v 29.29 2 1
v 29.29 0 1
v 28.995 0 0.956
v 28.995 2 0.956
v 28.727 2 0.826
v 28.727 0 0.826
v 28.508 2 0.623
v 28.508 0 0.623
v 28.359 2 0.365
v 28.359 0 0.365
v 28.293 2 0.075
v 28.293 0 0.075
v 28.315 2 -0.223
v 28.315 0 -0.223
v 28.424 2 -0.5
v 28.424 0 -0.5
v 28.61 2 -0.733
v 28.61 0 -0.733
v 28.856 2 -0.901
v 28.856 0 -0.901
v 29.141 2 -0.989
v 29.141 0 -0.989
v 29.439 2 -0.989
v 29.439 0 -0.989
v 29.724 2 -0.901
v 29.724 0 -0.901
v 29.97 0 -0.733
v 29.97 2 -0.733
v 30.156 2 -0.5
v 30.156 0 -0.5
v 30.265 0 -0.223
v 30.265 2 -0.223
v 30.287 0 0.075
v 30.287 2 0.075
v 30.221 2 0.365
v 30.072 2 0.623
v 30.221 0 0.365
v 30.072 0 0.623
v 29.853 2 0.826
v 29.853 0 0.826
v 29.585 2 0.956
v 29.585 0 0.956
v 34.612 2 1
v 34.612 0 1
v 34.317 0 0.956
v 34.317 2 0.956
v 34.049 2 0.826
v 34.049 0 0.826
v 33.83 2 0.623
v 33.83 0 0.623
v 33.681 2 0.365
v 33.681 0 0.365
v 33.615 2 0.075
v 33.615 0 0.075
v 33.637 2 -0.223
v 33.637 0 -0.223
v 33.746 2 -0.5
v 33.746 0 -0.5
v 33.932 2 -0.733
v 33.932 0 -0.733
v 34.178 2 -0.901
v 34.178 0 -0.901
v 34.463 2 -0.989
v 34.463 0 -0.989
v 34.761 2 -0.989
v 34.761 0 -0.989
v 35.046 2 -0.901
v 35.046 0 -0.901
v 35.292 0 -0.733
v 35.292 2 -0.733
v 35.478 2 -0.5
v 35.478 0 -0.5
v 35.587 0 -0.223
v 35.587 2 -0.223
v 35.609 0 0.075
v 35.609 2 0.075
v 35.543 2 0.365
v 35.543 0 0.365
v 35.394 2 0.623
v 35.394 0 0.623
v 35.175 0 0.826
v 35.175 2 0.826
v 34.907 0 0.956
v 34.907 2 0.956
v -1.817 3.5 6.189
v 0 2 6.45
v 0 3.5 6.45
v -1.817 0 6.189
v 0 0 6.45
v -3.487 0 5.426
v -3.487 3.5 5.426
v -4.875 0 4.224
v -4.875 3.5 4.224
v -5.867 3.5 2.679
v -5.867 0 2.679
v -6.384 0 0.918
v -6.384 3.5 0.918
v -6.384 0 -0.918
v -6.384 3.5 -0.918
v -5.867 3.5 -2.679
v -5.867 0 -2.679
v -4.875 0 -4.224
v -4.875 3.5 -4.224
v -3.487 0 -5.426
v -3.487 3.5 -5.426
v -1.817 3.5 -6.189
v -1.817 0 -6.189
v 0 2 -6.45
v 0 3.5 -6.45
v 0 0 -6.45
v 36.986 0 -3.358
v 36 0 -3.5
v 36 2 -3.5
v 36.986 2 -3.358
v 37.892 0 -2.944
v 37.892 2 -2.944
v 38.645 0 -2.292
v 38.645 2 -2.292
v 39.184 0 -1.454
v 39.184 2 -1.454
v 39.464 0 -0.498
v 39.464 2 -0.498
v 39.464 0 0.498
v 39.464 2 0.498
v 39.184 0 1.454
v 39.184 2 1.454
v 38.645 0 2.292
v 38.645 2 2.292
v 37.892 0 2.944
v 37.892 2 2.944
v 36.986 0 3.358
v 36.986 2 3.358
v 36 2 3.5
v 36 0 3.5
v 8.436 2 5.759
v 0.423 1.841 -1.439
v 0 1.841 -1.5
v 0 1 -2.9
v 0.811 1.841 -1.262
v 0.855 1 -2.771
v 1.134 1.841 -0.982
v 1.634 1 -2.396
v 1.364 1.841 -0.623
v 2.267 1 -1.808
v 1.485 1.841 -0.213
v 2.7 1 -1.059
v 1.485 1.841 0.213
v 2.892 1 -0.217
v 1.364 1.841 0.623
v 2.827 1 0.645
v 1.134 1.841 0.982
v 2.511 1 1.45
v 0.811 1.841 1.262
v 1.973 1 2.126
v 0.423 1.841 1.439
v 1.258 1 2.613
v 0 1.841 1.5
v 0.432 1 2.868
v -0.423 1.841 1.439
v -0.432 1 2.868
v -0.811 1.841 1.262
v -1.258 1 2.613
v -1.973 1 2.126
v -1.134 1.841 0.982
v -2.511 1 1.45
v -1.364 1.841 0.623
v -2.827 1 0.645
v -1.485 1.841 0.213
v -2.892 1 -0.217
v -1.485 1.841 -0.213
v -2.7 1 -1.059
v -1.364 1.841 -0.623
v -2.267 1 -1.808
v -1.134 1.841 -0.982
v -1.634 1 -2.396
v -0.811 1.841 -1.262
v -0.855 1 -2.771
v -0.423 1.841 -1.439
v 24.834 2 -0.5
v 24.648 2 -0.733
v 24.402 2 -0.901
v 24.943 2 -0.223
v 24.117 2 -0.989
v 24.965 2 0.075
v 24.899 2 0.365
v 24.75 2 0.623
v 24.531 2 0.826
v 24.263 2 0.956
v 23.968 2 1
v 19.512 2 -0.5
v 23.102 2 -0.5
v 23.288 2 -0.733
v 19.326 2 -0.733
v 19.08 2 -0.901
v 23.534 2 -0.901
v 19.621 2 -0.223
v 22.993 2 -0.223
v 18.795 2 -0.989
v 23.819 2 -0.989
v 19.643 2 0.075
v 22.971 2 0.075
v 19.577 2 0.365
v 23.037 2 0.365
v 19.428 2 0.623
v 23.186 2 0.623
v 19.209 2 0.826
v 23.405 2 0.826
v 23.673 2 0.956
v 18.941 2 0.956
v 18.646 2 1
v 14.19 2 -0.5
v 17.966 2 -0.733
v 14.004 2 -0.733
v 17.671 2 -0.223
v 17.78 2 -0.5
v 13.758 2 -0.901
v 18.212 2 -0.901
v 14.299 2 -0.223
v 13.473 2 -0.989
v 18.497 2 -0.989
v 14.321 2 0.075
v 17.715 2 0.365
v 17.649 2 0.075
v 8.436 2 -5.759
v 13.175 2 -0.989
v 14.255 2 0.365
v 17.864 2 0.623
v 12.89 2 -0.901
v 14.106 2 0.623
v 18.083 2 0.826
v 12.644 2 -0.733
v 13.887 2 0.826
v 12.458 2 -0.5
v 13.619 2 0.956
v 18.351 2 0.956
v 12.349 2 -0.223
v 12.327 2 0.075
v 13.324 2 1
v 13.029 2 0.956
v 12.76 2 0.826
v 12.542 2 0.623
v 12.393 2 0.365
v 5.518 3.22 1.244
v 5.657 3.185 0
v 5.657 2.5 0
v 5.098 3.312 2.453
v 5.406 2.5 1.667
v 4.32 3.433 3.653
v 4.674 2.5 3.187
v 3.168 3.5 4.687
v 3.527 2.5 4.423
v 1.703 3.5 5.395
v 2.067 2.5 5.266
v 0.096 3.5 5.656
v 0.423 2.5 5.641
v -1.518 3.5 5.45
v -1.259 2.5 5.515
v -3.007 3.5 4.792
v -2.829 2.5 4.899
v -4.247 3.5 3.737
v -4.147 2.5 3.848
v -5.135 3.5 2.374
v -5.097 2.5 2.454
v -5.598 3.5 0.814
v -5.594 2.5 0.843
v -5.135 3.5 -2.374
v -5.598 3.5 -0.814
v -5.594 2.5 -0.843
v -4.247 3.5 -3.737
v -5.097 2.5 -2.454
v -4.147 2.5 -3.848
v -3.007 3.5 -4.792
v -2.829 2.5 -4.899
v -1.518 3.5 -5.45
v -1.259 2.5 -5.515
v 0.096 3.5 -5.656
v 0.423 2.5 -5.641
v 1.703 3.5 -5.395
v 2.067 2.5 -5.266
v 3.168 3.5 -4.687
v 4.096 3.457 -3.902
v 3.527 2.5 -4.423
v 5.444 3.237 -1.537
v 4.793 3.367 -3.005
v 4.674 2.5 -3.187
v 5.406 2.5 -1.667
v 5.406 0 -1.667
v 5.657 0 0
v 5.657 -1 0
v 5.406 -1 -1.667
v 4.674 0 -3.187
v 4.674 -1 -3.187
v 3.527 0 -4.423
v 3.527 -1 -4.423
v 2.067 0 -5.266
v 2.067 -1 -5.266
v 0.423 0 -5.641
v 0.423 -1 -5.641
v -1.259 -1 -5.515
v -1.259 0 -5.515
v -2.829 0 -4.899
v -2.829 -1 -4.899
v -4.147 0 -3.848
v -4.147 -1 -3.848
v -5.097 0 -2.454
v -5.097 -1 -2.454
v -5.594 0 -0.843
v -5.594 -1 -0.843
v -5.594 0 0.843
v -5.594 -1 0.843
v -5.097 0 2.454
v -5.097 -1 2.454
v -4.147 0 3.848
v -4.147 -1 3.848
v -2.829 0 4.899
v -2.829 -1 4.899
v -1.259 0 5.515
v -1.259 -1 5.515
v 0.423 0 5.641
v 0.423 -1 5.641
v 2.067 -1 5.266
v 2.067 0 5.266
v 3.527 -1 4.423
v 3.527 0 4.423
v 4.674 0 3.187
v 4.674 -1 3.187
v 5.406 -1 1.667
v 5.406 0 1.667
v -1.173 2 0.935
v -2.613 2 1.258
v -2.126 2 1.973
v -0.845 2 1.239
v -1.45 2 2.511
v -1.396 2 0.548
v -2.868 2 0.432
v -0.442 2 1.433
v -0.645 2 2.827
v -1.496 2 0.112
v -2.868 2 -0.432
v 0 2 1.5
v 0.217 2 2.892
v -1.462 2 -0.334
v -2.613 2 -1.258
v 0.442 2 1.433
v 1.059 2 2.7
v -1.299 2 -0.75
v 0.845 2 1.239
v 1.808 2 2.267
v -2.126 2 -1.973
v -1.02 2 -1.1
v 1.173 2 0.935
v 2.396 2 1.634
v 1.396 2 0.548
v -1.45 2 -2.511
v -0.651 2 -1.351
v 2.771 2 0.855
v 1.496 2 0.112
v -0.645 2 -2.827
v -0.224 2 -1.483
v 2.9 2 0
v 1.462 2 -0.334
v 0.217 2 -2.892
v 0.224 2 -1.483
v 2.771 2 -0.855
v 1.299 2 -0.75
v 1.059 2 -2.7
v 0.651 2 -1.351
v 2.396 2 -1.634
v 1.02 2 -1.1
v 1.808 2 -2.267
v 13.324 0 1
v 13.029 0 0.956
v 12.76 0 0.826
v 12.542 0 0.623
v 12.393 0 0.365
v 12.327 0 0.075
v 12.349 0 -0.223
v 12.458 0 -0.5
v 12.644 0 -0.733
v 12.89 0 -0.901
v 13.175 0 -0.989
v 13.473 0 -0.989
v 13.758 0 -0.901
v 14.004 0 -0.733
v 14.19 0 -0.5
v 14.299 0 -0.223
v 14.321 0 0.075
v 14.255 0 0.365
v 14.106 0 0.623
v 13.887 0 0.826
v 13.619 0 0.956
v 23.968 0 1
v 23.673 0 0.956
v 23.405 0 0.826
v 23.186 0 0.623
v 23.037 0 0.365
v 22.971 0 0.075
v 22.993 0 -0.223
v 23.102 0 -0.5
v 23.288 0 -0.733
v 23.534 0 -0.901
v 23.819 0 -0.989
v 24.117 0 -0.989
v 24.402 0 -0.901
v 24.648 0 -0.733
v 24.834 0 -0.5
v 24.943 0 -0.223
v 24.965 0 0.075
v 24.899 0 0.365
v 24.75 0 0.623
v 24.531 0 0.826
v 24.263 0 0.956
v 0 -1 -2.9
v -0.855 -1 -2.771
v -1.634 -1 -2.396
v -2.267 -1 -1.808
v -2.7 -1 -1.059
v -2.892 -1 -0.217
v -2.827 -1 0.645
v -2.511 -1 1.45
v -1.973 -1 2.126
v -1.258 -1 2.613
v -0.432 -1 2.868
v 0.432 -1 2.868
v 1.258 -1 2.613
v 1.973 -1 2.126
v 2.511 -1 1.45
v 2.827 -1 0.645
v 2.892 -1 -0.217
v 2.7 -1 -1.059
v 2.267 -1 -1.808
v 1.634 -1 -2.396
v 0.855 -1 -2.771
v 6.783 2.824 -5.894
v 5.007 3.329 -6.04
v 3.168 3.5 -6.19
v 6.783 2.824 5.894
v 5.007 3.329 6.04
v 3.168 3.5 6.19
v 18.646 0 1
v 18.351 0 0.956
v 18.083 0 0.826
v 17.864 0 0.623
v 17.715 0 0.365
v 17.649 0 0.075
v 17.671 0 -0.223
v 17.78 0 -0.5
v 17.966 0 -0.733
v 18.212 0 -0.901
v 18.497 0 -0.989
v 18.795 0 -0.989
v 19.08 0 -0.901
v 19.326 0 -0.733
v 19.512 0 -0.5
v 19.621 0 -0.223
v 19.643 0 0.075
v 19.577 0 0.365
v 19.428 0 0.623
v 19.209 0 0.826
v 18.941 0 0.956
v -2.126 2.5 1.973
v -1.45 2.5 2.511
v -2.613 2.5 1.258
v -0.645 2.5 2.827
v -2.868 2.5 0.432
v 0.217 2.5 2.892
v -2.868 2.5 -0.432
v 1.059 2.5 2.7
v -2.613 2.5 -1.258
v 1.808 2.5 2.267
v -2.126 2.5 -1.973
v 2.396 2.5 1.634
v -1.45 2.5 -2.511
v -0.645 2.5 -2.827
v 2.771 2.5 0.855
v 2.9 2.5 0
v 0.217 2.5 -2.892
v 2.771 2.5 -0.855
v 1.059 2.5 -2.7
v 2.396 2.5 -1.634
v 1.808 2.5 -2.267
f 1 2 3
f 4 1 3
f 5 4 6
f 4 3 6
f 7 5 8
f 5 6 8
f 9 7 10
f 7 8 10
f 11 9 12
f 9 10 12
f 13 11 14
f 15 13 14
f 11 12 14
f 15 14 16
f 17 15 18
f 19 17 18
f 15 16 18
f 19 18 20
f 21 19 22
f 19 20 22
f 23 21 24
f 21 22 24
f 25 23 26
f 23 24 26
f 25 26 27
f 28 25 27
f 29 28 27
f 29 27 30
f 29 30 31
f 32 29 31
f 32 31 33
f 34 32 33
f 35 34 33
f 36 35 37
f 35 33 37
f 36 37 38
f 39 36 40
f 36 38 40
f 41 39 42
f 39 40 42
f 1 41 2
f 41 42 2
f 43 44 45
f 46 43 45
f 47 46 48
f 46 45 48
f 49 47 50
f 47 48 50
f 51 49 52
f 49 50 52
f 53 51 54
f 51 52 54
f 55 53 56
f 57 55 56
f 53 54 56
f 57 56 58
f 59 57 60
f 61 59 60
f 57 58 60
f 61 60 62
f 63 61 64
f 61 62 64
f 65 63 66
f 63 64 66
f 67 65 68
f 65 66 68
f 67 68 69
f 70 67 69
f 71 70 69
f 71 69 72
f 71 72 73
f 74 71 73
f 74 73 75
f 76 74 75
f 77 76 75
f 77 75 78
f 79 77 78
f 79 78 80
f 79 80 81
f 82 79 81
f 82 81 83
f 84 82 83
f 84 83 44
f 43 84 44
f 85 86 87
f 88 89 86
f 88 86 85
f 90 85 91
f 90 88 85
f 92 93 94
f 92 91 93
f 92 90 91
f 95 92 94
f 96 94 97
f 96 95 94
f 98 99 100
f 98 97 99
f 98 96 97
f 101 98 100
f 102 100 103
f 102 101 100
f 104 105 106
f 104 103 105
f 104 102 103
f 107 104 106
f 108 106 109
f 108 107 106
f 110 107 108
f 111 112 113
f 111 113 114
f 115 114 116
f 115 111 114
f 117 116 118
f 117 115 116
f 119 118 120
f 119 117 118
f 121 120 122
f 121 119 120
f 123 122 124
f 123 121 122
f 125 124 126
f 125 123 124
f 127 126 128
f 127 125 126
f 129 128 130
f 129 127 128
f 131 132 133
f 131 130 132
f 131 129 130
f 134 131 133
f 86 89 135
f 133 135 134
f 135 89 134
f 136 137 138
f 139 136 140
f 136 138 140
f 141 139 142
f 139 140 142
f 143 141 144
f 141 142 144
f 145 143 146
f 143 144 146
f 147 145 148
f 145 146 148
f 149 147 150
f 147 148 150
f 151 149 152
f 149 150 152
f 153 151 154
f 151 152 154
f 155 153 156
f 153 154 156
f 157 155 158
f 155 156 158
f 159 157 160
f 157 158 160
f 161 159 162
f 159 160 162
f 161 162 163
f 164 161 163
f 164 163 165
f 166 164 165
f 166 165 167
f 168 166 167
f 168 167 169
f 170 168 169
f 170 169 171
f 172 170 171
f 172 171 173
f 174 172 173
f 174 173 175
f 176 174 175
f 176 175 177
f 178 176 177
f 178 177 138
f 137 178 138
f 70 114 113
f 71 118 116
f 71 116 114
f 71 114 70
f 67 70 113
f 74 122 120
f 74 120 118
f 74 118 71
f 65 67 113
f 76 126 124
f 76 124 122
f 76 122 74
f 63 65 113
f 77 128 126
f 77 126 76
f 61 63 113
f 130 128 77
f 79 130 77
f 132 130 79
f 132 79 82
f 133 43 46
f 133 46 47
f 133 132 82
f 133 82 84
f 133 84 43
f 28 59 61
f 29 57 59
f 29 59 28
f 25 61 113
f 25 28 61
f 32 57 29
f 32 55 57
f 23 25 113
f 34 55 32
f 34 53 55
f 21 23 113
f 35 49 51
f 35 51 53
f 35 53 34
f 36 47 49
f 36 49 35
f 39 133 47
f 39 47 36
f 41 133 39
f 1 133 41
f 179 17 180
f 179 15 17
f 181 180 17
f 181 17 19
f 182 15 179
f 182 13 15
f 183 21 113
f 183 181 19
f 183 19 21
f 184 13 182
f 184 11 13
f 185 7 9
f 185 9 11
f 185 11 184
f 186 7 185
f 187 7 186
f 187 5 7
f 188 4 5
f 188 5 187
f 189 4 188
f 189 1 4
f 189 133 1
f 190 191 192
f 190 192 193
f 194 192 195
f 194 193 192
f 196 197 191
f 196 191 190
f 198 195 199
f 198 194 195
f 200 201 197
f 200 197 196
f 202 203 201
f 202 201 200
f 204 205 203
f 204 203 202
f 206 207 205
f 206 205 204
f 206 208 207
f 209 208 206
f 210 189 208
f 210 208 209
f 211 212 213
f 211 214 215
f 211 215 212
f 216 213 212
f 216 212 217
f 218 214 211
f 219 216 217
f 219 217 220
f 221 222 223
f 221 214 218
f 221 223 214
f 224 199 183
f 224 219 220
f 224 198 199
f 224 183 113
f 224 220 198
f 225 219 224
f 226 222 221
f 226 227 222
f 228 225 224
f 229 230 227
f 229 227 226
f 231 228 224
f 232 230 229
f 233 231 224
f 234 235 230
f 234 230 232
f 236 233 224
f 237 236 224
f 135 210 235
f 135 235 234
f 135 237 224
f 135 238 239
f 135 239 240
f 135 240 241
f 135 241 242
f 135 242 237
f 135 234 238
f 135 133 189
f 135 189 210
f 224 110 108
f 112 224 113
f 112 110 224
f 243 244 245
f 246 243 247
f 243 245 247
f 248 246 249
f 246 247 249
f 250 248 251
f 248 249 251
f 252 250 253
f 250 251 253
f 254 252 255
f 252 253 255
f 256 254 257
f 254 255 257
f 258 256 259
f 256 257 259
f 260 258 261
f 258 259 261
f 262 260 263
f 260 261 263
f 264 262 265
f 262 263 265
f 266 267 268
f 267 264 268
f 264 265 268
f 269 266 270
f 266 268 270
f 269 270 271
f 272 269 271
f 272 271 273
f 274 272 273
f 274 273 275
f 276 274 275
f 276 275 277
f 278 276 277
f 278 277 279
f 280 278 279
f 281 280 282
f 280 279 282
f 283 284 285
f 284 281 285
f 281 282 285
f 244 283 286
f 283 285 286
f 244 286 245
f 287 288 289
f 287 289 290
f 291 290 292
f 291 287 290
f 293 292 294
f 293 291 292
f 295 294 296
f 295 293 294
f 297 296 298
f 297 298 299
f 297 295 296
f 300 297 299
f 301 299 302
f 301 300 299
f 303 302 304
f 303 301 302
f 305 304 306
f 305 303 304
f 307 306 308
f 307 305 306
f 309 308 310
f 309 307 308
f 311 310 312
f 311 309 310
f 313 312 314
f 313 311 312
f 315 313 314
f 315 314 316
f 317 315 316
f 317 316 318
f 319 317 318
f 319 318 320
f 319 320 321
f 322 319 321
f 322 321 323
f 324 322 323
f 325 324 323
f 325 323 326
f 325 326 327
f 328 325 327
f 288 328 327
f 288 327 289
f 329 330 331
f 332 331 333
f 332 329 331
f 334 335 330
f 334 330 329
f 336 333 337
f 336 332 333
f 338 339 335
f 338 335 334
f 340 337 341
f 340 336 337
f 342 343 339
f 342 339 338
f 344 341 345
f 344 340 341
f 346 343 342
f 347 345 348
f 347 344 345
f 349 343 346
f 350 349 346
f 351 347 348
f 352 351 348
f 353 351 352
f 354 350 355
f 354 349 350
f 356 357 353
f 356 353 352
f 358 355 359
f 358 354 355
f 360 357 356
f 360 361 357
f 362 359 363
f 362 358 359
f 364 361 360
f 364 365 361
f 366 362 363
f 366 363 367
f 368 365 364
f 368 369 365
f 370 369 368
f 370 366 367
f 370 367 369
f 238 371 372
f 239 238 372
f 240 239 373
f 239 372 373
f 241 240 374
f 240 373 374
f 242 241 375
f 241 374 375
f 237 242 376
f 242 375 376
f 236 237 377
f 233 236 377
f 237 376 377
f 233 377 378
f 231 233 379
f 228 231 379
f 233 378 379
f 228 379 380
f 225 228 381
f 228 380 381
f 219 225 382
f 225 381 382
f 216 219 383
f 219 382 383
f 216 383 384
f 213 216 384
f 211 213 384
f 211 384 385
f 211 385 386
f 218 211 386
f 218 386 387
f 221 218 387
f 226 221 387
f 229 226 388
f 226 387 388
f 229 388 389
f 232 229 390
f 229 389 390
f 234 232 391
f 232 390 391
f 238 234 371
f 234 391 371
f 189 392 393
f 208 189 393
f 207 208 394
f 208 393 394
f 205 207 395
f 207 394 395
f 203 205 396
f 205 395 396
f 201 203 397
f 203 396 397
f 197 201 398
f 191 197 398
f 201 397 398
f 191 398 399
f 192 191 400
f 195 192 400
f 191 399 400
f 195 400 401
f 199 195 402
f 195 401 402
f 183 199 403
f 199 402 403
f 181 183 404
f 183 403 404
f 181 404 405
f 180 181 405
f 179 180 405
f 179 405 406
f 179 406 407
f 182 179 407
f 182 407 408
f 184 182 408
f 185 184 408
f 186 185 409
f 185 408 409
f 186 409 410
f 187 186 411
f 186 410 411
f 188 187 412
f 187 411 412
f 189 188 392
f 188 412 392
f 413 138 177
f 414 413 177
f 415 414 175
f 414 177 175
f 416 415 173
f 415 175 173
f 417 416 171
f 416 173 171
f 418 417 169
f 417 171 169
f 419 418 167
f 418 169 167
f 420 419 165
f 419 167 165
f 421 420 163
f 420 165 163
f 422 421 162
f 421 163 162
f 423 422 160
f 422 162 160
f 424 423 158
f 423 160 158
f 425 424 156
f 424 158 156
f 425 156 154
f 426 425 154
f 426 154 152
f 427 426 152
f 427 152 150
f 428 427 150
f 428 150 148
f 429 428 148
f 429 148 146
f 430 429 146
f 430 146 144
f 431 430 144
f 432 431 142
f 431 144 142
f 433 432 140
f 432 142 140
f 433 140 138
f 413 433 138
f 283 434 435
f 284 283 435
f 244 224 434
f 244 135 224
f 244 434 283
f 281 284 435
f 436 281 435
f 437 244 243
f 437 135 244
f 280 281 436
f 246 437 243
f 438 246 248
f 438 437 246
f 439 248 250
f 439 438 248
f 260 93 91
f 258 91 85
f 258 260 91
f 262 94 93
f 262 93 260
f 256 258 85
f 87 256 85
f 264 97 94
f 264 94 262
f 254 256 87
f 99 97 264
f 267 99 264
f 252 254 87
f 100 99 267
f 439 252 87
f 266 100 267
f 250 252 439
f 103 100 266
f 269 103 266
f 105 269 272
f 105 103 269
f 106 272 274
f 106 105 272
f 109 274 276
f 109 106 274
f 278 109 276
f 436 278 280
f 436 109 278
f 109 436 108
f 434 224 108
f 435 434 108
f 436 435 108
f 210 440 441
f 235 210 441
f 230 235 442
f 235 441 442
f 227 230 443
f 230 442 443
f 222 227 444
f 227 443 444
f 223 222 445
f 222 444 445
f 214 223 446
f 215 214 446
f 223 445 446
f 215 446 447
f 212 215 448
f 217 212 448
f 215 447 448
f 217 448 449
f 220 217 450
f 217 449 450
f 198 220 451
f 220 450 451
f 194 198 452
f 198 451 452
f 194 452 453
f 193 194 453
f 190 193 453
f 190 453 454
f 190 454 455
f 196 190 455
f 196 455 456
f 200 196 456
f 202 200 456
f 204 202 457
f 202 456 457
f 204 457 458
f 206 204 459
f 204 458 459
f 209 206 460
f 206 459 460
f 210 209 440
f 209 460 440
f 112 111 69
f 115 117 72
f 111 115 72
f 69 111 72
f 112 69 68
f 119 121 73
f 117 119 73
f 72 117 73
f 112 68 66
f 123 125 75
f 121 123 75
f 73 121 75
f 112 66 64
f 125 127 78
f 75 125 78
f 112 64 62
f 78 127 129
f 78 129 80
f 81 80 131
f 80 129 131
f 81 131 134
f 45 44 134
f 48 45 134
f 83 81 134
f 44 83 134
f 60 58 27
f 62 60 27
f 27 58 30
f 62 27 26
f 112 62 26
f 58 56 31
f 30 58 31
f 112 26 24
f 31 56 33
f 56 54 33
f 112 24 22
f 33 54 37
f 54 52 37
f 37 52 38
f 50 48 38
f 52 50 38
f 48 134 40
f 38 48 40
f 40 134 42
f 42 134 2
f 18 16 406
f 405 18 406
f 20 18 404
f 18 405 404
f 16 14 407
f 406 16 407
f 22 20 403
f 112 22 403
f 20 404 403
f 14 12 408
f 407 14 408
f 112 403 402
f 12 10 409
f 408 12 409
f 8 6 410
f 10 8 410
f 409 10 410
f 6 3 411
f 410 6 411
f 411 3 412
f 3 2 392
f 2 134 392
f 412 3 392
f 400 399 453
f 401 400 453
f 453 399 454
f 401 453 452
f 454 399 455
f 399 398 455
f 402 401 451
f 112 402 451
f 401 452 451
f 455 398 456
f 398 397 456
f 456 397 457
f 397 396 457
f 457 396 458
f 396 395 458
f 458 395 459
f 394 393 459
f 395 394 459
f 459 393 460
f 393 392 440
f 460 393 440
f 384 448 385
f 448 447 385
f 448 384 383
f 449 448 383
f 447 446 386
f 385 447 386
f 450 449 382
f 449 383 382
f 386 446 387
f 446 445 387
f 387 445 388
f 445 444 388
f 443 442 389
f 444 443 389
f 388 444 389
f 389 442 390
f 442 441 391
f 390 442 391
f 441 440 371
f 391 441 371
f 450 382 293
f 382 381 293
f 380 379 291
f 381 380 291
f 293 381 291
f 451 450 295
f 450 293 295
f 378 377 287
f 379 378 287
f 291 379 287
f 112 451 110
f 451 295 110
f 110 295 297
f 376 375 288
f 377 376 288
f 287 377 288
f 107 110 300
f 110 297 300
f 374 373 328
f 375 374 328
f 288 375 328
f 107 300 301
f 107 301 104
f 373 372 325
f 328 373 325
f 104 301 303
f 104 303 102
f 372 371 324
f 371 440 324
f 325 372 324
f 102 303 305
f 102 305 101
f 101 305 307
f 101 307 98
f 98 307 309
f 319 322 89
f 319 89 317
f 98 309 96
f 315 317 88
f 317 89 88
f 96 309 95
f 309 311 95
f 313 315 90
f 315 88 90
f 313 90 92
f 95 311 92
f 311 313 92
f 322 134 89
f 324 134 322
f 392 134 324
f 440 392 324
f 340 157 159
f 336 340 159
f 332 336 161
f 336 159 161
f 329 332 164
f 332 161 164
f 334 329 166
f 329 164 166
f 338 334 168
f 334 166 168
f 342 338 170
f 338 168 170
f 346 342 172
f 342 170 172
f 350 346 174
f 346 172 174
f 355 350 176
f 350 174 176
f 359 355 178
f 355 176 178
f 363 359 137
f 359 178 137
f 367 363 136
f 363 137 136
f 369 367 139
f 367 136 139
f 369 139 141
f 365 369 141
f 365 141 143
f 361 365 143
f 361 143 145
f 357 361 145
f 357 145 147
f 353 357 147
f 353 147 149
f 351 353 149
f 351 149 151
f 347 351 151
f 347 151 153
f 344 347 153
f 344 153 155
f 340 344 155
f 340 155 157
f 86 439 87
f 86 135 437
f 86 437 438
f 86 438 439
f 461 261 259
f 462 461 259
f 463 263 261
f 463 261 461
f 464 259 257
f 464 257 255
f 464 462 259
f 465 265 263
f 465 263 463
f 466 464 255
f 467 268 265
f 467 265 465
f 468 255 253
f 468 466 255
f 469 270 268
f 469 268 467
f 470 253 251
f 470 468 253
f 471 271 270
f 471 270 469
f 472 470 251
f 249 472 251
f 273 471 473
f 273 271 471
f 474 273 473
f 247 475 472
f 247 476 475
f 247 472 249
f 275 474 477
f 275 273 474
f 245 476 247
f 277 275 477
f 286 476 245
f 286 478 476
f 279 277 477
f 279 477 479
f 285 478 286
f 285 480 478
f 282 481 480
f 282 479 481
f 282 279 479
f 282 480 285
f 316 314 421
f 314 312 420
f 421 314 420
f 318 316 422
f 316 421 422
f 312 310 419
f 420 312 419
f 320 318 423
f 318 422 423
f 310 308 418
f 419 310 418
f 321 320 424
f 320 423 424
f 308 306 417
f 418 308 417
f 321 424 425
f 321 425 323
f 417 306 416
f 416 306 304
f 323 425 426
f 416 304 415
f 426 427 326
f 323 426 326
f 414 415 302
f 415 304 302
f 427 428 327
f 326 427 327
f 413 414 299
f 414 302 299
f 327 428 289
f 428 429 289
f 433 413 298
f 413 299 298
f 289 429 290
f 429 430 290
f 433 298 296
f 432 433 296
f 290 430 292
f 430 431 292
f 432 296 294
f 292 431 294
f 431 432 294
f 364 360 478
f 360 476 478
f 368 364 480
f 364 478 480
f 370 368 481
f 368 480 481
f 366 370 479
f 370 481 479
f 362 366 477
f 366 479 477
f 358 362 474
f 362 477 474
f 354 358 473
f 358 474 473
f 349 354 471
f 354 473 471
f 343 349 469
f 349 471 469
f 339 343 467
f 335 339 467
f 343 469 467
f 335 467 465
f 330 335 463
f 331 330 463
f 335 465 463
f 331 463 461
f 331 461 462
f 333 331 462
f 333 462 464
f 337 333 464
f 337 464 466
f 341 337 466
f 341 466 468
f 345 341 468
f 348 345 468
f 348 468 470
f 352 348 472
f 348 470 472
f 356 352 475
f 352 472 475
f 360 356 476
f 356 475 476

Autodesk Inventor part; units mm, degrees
ref_plane "YZ Plane" through (0, 0, 0) normal (1, 0, 0) x (0, 1, 0)
ref_plane "XZ Plane" through (0, 0, 0) normal (0, 1, 0) x (-1, 0, 0)
ref_plane "XY Plane" through (0, 0, 0) normal (0, 0, 1) x (1, 0, 0)
sketch "Sketch1" plane through (0, 0, 0) normal (0, 1, 0) x (-1, 0, 0)
  circle A0 centre (0, 0) radius 6.45
  circle A1 centre (0, 0) radius 5.657
  circle A2 centre (0, 0) radius 2.85
  circle A3 centre (0, 0) radius 1.5
  line L0 (0, 0) -> (-36, 0)
  circle A4 centre (-36, 0) radius 3.5
  line L1 (0, 6.45) -> (-36, 3.5)
  line L2 (0, -6.45) -> (-36, -3.5)
  dimension "d0" = 12.9
  dimension "d1" = 11.314
  dimension "d2" = 5.7
  dimension "d3" = 3
  dimension "d4" = 36
  dimension "d5" = 7
extrude "Extrusion1" add sketch "Sketch1" along normal blind 2 contours A0 L2 L1 | A0 L0 A4 L1 | L2 A4 L0 A0 | A4
sketch "Sketch2" plane through (0, 2, 0) normal (0, 1, 0) x (1, 0, 0)
  line L0 (8.4358, -5.7587) -> (8.4358, 5.7587)
  line L1 (8.4358, -5.7587) -> (0, -6.45)
  line L2 (0, -6.45) -> (36, -3.5) projected
  line L3 (8.4358, 5.7587) -> (0, 6.45)
  line L4 (36, 3.5) -> (0, 6.45) projected
  arc A0 (0, 6.45) -> (0, -6.45) centre (0, 0) ccw
  arc A1 (0, 6.45) -> (0, -6.45) centre (0, 0) ccw projected
  circle A2 centre (0, 0) radius 5.657
extrude "Extrusion2" add sketch "Sketch2" along normal blind 1.5
fillet "Fillet1" radius 10 1 edges at (8.4358, 3.5, 0)
sketch "Sketch4" plane through (0, 2, 0) normal (0, 1, 0) x (1, 0, 0)
  circle A0 centre (0, 0) radius 2.9
  circle A1 centre (0, 0) radius 1.5
  dimension "d11" = 5.8
  dimension "d12" = 3
sketch "Sketch5" plane through (0, 2, 0) normal (0, 1, 0) x (1, 0, 0)
  circle A0 centre (0, 0) radius 5.657
extrude "Extrusion3" add sketch "Sketch5" along normal blind 0.5 and the other way blind 3
sketch "Sketch6" plane through (0, 2.5, 0) normal (0, 1, 0) x (1, 0, 0)
  circle A0 centre (0, 0) radius 2.9
  dimension "d17" = 5.8
extrude "Extrusion4" cut sketch "Sketch6" against normal blind 0.5
hole "Hole1" at (0, 2, 0) direction (0, -1, 0) diameter 3 end through all
sketch "Sketch7" plane through (0, -1, 0) normal (0, -1, 0) x (1, 0, 0)
  circle A0 centre (0, 0) radius 2.9
  dimension "d27" = 5.8
hole "Hole2" at (0, -1, 0) direction (0, 1, 0) diameter 5.8 depth 2 tip angle 118
sketch "Sketch9" plane through (0, 2, 0) normal (0, 1, 0) x (1, 0, 0)
  line L0 (8.4358, 5.7587) -> (8.4358, -5.7587) projected
  arc A0 (36, -3.5) -> (36, 3.5) centre (36, 0) ccw projected
  circle A1 centre (23.9679, 0) radius 1
  circle A2 centre (34.612, 0) radius 1
  line L1 (0, -6.45) -> (36, -3.5) projected
  circle A3 centre (29.29, 0) radius 1
  circle A4 centre (13.3238, 0) radius 1
  circle A5 centre (18.6459, 0) radius 1
  point P0 (0, 0)
hole "Hole4" at (13.3238, 2, 0) at (18.6459, 2, 0) at (23.9679, 2, 0) at (29.29, 2, 0) at (34.612, 2, 0) direction (0, -1, 0) diameter 2 end through all
properties part number "servo_arm_2"
